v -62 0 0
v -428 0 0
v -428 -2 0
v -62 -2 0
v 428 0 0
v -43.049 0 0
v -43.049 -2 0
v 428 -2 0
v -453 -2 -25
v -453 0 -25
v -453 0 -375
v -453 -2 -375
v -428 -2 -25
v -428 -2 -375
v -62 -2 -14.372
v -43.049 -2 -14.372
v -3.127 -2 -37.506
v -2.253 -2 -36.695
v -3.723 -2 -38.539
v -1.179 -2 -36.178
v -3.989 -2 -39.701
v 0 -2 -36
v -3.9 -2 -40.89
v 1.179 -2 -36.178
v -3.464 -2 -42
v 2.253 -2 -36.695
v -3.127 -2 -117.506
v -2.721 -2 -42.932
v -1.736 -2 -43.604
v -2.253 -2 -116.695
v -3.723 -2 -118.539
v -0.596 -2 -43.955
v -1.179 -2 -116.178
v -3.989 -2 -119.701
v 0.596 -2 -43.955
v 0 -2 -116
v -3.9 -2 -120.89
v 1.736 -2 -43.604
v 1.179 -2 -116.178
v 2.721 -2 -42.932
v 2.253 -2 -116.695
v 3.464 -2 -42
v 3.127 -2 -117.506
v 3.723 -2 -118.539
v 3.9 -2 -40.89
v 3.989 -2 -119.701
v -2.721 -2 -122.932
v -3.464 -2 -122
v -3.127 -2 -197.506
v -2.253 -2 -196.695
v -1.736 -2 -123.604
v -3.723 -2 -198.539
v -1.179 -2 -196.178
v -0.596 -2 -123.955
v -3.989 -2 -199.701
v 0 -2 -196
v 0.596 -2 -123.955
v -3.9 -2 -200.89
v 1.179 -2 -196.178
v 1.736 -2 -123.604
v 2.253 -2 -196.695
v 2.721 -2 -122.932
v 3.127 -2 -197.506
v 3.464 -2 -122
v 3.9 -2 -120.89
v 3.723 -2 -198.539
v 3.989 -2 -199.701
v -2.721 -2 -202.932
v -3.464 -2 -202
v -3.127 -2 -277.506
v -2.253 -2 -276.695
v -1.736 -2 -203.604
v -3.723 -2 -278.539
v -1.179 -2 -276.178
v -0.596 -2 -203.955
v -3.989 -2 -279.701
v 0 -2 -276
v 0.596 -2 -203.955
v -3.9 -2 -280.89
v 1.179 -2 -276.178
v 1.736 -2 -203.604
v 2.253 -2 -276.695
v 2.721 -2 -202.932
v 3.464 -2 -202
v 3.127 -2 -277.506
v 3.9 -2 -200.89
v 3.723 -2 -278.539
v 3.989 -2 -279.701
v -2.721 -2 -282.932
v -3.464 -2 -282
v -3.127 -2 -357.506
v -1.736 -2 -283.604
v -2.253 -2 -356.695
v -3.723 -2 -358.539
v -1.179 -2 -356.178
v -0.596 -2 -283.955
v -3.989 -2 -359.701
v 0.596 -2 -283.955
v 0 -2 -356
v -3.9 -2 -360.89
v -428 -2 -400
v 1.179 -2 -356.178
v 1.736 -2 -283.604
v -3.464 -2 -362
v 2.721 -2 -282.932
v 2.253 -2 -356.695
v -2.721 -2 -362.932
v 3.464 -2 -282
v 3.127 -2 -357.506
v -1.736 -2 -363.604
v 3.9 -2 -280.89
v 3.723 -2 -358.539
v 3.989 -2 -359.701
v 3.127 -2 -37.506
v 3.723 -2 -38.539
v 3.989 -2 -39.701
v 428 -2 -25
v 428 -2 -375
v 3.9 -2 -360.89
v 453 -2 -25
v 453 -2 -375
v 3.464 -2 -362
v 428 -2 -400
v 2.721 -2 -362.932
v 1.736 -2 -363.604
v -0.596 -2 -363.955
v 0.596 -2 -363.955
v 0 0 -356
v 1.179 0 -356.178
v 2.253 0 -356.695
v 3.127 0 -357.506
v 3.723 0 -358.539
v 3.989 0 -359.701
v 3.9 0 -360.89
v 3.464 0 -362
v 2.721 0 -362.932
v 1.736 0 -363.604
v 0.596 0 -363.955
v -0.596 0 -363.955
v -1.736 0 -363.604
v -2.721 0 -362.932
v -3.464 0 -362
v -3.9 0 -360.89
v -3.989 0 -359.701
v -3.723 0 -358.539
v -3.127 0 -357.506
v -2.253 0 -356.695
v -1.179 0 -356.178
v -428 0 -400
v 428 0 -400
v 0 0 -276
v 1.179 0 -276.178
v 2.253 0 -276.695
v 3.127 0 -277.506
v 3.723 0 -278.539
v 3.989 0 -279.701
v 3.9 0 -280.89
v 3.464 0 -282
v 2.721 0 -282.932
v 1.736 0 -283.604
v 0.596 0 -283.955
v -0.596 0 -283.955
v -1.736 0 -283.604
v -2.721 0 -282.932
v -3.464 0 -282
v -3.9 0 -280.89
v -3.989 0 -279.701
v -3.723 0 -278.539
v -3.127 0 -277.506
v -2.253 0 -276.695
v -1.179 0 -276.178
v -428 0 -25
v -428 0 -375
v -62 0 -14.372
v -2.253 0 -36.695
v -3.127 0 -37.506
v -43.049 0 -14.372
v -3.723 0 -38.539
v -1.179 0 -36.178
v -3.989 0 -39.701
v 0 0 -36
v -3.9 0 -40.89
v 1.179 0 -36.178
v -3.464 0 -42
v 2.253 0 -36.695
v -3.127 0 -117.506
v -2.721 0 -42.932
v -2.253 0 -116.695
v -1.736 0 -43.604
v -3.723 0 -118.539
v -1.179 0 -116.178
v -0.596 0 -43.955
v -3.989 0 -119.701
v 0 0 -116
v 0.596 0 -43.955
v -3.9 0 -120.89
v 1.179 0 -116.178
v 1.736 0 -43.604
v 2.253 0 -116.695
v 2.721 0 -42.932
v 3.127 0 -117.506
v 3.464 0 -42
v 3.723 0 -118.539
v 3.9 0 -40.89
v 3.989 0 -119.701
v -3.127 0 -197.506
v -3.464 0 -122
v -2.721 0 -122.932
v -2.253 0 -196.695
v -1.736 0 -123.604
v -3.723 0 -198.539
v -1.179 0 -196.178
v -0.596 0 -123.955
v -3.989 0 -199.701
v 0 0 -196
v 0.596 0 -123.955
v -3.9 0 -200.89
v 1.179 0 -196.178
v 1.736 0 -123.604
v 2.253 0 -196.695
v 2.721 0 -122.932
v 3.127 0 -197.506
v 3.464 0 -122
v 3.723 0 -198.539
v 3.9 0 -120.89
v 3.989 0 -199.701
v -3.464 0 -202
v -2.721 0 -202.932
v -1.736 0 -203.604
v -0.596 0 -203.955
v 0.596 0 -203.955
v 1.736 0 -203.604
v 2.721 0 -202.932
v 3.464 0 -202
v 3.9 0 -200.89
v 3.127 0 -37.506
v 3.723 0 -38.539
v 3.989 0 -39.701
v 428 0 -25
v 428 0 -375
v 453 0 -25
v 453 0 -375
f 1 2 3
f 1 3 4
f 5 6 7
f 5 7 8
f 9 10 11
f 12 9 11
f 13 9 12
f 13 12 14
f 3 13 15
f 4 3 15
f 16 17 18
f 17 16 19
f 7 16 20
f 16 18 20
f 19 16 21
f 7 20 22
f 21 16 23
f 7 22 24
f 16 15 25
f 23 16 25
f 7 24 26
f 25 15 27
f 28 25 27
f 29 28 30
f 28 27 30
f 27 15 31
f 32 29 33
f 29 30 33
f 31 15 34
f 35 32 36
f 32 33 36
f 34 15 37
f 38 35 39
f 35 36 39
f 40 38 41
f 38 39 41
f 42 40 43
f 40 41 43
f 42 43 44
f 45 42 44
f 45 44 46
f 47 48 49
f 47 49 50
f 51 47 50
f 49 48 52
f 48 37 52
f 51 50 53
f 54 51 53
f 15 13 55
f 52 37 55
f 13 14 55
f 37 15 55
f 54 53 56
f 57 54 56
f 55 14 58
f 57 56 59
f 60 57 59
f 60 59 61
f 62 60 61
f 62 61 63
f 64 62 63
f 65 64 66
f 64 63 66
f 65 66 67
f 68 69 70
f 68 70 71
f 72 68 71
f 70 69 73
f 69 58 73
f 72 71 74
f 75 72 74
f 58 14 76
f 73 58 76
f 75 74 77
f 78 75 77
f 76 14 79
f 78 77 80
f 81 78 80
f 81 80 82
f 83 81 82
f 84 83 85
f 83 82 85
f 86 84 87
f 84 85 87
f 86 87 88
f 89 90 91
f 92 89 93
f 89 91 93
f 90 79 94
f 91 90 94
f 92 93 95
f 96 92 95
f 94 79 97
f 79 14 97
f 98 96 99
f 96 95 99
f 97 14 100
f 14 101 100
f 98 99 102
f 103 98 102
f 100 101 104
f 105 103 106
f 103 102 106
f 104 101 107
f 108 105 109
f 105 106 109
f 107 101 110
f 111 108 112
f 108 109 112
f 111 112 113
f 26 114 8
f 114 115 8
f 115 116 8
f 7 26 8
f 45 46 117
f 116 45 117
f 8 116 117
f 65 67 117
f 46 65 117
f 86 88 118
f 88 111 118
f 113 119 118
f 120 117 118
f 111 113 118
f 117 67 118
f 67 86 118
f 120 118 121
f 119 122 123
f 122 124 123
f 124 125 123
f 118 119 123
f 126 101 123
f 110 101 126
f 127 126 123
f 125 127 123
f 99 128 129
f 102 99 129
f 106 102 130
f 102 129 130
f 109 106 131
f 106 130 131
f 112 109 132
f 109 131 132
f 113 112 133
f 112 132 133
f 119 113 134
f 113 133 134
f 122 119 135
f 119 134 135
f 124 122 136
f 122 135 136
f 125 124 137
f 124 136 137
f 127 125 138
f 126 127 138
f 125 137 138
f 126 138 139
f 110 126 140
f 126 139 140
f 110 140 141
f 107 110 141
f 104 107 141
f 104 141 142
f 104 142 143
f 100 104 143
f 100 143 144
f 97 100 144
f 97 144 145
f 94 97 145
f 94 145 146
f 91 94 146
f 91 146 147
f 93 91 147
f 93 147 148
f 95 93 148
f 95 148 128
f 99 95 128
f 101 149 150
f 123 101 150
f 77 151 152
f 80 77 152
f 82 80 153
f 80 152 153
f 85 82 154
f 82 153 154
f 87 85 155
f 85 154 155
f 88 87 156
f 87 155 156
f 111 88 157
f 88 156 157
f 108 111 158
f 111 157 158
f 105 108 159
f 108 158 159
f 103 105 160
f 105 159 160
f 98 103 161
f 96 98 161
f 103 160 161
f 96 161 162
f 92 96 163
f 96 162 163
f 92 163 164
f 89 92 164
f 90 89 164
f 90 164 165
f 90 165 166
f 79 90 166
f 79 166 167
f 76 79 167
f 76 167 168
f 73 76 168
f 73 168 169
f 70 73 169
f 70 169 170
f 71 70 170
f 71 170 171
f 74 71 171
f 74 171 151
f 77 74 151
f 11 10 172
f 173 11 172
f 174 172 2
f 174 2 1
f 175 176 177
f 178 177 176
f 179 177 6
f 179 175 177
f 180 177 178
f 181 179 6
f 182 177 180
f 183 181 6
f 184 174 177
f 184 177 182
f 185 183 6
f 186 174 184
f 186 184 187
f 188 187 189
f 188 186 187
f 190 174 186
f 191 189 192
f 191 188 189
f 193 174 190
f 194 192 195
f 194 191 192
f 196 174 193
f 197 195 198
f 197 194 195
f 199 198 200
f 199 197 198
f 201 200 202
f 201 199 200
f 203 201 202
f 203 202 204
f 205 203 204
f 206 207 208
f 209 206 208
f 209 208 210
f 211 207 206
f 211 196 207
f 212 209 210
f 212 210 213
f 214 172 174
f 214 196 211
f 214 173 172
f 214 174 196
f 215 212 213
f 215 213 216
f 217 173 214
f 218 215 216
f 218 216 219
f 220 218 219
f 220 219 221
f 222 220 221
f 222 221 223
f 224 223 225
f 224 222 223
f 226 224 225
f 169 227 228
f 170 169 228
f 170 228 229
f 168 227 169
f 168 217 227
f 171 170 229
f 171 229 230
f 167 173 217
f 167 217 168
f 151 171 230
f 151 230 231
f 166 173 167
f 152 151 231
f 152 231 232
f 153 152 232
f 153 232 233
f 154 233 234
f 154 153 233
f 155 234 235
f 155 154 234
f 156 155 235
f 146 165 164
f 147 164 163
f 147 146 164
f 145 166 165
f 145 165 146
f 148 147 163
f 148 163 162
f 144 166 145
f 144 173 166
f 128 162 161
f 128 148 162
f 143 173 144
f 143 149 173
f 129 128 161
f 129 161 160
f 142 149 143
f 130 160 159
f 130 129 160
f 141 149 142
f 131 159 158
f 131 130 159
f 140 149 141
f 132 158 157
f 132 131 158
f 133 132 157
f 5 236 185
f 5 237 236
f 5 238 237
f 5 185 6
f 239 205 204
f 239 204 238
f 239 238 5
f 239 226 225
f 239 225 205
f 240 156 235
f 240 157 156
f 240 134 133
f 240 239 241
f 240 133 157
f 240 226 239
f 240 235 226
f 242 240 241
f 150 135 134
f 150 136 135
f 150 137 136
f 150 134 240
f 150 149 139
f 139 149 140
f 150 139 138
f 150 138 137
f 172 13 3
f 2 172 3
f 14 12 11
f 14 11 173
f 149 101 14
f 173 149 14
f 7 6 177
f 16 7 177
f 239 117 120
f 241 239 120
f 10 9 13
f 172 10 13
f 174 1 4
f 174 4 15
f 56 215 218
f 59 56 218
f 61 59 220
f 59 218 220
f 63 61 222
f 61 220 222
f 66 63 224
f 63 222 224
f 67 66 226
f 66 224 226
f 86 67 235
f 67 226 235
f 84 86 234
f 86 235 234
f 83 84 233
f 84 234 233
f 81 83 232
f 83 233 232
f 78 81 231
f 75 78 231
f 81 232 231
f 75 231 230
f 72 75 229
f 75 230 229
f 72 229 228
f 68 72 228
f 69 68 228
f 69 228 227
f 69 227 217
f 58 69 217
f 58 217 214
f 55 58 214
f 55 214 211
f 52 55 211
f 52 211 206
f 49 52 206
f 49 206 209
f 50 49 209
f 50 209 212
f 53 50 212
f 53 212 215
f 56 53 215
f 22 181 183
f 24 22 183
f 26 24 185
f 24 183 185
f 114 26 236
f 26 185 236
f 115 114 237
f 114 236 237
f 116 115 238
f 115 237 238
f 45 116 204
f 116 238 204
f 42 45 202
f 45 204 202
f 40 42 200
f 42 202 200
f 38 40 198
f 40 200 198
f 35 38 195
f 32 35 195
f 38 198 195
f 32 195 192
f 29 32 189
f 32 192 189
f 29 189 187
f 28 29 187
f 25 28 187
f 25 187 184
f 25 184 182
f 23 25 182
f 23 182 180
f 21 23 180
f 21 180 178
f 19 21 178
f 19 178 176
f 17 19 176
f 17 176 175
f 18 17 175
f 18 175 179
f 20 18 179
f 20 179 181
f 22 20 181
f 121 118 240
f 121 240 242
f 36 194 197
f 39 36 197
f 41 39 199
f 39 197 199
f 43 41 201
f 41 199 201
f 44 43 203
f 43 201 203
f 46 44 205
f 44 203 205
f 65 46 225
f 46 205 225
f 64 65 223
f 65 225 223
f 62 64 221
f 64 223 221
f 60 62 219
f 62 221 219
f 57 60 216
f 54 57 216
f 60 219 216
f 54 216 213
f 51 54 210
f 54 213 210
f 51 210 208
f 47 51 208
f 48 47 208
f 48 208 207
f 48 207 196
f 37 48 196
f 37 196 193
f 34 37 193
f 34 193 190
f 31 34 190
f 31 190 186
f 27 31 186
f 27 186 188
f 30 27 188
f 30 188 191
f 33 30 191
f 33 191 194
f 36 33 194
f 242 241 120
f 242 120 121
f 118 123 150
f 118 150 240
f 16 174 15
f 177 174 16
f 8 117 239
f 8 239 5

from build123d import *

# Parameters (mm, degrees)
IZIM1_W               = 906
IZIM1_H               = 400
TABAN_FLAN_1_DEPTH    = 2
IZIM6_W               = 25
IZIM6_H               = 25
KES_EKSTR_ZYON1_DEPTH = 10
IZIM7_R               = 4
KES_EKSTR_ZYON2_DEPTH = 10
IZIM8_W               = 18.951494712
IZIM8_H               = 21.871958868
KES_EKSTR_ZYON3_DEPTH = 10


# Sheet-metal steps are written as plain solids
with BuildPart() as part:
    # Çizim1 → Taban-Flanş1 (new body)
    with BuildSketch(Plane(origin=(0, 0, 0), x_dir=(1, 0, 0), z_dir=(0, 1, 0))):
        with Locations((0, 200)):
            Rectangle(IZIM1_W, IZIM1_H)
    extrude(amount=-TABAN_FLAN_1_DEPTH)

    # Çizim6 → Kes-Ekstrüzyon1 (cut)
    with BuildSketch(Plane.XZ.offset(2)):
        with Locations((-440.5, -12.5)):
            Rectangle(IZIM6_W, IZIM6_H)
        with Locations((440.5, -12.5)):
            Rectangle(IZIM6_W, IZIM6_H)
        with Locations((440.5, -387.5)):
            Rectangle(IZIM6_W, IZIM6_H)
        with Locations((-440.5, -387.5)):
            Rectangle(IZIM6_W, IZIM6_H)
    extrude(amount=-KES_EKSTR_ZYON1_DEPTH, mode=Mode.SUBTRACT)

    # Çizim7 → Kes-Ekstrüzyon2 (cut)
    with BuildSketch(Plane(origin=(0, 0, 0), x_dir=(1, 0, 0), z_dir=(0, 1, 0))):
        with Locations(Location((0, 360, 0), (0, 0, 270))):
            Circle(IZIM7_R)
        with Locations(Location((0, 280, 0), (0, 0, 270))):
            Circle(IZIM7_R)
        with Locations(Location((0, 200, 0), (0, 0, 270))):
            Circle(IZIM7_R)
        with Locations(Location((0, 120, 0), (0, 0, 270))):
            Circle(IZIM7_R)
        with Locations(Location((0, 40, 0), (0, 0, 270))):
            Circle(IZIM7_R)
    extrude(amount=-KES_EKSTR_ZYON2_DEPTH, mode=Mode.SUBTRACT)

    # Çizim8 → Kes-Ekstrüzyon3 (cut)
    with BuildSketch(Plane(origin=(0, 0, 0), x_dir=(1, 0, 0), z_dir=(0, 1, 0))):
        with Locations((-52.524252644, 3.435979434)):
            Rectangle(IZIM8_W, IZIM8_H)
    extrude(amount=-KES_EKSTR_ZYON3_DEPTH, mode=Mode.SUBTRACT)


solid = part.part
